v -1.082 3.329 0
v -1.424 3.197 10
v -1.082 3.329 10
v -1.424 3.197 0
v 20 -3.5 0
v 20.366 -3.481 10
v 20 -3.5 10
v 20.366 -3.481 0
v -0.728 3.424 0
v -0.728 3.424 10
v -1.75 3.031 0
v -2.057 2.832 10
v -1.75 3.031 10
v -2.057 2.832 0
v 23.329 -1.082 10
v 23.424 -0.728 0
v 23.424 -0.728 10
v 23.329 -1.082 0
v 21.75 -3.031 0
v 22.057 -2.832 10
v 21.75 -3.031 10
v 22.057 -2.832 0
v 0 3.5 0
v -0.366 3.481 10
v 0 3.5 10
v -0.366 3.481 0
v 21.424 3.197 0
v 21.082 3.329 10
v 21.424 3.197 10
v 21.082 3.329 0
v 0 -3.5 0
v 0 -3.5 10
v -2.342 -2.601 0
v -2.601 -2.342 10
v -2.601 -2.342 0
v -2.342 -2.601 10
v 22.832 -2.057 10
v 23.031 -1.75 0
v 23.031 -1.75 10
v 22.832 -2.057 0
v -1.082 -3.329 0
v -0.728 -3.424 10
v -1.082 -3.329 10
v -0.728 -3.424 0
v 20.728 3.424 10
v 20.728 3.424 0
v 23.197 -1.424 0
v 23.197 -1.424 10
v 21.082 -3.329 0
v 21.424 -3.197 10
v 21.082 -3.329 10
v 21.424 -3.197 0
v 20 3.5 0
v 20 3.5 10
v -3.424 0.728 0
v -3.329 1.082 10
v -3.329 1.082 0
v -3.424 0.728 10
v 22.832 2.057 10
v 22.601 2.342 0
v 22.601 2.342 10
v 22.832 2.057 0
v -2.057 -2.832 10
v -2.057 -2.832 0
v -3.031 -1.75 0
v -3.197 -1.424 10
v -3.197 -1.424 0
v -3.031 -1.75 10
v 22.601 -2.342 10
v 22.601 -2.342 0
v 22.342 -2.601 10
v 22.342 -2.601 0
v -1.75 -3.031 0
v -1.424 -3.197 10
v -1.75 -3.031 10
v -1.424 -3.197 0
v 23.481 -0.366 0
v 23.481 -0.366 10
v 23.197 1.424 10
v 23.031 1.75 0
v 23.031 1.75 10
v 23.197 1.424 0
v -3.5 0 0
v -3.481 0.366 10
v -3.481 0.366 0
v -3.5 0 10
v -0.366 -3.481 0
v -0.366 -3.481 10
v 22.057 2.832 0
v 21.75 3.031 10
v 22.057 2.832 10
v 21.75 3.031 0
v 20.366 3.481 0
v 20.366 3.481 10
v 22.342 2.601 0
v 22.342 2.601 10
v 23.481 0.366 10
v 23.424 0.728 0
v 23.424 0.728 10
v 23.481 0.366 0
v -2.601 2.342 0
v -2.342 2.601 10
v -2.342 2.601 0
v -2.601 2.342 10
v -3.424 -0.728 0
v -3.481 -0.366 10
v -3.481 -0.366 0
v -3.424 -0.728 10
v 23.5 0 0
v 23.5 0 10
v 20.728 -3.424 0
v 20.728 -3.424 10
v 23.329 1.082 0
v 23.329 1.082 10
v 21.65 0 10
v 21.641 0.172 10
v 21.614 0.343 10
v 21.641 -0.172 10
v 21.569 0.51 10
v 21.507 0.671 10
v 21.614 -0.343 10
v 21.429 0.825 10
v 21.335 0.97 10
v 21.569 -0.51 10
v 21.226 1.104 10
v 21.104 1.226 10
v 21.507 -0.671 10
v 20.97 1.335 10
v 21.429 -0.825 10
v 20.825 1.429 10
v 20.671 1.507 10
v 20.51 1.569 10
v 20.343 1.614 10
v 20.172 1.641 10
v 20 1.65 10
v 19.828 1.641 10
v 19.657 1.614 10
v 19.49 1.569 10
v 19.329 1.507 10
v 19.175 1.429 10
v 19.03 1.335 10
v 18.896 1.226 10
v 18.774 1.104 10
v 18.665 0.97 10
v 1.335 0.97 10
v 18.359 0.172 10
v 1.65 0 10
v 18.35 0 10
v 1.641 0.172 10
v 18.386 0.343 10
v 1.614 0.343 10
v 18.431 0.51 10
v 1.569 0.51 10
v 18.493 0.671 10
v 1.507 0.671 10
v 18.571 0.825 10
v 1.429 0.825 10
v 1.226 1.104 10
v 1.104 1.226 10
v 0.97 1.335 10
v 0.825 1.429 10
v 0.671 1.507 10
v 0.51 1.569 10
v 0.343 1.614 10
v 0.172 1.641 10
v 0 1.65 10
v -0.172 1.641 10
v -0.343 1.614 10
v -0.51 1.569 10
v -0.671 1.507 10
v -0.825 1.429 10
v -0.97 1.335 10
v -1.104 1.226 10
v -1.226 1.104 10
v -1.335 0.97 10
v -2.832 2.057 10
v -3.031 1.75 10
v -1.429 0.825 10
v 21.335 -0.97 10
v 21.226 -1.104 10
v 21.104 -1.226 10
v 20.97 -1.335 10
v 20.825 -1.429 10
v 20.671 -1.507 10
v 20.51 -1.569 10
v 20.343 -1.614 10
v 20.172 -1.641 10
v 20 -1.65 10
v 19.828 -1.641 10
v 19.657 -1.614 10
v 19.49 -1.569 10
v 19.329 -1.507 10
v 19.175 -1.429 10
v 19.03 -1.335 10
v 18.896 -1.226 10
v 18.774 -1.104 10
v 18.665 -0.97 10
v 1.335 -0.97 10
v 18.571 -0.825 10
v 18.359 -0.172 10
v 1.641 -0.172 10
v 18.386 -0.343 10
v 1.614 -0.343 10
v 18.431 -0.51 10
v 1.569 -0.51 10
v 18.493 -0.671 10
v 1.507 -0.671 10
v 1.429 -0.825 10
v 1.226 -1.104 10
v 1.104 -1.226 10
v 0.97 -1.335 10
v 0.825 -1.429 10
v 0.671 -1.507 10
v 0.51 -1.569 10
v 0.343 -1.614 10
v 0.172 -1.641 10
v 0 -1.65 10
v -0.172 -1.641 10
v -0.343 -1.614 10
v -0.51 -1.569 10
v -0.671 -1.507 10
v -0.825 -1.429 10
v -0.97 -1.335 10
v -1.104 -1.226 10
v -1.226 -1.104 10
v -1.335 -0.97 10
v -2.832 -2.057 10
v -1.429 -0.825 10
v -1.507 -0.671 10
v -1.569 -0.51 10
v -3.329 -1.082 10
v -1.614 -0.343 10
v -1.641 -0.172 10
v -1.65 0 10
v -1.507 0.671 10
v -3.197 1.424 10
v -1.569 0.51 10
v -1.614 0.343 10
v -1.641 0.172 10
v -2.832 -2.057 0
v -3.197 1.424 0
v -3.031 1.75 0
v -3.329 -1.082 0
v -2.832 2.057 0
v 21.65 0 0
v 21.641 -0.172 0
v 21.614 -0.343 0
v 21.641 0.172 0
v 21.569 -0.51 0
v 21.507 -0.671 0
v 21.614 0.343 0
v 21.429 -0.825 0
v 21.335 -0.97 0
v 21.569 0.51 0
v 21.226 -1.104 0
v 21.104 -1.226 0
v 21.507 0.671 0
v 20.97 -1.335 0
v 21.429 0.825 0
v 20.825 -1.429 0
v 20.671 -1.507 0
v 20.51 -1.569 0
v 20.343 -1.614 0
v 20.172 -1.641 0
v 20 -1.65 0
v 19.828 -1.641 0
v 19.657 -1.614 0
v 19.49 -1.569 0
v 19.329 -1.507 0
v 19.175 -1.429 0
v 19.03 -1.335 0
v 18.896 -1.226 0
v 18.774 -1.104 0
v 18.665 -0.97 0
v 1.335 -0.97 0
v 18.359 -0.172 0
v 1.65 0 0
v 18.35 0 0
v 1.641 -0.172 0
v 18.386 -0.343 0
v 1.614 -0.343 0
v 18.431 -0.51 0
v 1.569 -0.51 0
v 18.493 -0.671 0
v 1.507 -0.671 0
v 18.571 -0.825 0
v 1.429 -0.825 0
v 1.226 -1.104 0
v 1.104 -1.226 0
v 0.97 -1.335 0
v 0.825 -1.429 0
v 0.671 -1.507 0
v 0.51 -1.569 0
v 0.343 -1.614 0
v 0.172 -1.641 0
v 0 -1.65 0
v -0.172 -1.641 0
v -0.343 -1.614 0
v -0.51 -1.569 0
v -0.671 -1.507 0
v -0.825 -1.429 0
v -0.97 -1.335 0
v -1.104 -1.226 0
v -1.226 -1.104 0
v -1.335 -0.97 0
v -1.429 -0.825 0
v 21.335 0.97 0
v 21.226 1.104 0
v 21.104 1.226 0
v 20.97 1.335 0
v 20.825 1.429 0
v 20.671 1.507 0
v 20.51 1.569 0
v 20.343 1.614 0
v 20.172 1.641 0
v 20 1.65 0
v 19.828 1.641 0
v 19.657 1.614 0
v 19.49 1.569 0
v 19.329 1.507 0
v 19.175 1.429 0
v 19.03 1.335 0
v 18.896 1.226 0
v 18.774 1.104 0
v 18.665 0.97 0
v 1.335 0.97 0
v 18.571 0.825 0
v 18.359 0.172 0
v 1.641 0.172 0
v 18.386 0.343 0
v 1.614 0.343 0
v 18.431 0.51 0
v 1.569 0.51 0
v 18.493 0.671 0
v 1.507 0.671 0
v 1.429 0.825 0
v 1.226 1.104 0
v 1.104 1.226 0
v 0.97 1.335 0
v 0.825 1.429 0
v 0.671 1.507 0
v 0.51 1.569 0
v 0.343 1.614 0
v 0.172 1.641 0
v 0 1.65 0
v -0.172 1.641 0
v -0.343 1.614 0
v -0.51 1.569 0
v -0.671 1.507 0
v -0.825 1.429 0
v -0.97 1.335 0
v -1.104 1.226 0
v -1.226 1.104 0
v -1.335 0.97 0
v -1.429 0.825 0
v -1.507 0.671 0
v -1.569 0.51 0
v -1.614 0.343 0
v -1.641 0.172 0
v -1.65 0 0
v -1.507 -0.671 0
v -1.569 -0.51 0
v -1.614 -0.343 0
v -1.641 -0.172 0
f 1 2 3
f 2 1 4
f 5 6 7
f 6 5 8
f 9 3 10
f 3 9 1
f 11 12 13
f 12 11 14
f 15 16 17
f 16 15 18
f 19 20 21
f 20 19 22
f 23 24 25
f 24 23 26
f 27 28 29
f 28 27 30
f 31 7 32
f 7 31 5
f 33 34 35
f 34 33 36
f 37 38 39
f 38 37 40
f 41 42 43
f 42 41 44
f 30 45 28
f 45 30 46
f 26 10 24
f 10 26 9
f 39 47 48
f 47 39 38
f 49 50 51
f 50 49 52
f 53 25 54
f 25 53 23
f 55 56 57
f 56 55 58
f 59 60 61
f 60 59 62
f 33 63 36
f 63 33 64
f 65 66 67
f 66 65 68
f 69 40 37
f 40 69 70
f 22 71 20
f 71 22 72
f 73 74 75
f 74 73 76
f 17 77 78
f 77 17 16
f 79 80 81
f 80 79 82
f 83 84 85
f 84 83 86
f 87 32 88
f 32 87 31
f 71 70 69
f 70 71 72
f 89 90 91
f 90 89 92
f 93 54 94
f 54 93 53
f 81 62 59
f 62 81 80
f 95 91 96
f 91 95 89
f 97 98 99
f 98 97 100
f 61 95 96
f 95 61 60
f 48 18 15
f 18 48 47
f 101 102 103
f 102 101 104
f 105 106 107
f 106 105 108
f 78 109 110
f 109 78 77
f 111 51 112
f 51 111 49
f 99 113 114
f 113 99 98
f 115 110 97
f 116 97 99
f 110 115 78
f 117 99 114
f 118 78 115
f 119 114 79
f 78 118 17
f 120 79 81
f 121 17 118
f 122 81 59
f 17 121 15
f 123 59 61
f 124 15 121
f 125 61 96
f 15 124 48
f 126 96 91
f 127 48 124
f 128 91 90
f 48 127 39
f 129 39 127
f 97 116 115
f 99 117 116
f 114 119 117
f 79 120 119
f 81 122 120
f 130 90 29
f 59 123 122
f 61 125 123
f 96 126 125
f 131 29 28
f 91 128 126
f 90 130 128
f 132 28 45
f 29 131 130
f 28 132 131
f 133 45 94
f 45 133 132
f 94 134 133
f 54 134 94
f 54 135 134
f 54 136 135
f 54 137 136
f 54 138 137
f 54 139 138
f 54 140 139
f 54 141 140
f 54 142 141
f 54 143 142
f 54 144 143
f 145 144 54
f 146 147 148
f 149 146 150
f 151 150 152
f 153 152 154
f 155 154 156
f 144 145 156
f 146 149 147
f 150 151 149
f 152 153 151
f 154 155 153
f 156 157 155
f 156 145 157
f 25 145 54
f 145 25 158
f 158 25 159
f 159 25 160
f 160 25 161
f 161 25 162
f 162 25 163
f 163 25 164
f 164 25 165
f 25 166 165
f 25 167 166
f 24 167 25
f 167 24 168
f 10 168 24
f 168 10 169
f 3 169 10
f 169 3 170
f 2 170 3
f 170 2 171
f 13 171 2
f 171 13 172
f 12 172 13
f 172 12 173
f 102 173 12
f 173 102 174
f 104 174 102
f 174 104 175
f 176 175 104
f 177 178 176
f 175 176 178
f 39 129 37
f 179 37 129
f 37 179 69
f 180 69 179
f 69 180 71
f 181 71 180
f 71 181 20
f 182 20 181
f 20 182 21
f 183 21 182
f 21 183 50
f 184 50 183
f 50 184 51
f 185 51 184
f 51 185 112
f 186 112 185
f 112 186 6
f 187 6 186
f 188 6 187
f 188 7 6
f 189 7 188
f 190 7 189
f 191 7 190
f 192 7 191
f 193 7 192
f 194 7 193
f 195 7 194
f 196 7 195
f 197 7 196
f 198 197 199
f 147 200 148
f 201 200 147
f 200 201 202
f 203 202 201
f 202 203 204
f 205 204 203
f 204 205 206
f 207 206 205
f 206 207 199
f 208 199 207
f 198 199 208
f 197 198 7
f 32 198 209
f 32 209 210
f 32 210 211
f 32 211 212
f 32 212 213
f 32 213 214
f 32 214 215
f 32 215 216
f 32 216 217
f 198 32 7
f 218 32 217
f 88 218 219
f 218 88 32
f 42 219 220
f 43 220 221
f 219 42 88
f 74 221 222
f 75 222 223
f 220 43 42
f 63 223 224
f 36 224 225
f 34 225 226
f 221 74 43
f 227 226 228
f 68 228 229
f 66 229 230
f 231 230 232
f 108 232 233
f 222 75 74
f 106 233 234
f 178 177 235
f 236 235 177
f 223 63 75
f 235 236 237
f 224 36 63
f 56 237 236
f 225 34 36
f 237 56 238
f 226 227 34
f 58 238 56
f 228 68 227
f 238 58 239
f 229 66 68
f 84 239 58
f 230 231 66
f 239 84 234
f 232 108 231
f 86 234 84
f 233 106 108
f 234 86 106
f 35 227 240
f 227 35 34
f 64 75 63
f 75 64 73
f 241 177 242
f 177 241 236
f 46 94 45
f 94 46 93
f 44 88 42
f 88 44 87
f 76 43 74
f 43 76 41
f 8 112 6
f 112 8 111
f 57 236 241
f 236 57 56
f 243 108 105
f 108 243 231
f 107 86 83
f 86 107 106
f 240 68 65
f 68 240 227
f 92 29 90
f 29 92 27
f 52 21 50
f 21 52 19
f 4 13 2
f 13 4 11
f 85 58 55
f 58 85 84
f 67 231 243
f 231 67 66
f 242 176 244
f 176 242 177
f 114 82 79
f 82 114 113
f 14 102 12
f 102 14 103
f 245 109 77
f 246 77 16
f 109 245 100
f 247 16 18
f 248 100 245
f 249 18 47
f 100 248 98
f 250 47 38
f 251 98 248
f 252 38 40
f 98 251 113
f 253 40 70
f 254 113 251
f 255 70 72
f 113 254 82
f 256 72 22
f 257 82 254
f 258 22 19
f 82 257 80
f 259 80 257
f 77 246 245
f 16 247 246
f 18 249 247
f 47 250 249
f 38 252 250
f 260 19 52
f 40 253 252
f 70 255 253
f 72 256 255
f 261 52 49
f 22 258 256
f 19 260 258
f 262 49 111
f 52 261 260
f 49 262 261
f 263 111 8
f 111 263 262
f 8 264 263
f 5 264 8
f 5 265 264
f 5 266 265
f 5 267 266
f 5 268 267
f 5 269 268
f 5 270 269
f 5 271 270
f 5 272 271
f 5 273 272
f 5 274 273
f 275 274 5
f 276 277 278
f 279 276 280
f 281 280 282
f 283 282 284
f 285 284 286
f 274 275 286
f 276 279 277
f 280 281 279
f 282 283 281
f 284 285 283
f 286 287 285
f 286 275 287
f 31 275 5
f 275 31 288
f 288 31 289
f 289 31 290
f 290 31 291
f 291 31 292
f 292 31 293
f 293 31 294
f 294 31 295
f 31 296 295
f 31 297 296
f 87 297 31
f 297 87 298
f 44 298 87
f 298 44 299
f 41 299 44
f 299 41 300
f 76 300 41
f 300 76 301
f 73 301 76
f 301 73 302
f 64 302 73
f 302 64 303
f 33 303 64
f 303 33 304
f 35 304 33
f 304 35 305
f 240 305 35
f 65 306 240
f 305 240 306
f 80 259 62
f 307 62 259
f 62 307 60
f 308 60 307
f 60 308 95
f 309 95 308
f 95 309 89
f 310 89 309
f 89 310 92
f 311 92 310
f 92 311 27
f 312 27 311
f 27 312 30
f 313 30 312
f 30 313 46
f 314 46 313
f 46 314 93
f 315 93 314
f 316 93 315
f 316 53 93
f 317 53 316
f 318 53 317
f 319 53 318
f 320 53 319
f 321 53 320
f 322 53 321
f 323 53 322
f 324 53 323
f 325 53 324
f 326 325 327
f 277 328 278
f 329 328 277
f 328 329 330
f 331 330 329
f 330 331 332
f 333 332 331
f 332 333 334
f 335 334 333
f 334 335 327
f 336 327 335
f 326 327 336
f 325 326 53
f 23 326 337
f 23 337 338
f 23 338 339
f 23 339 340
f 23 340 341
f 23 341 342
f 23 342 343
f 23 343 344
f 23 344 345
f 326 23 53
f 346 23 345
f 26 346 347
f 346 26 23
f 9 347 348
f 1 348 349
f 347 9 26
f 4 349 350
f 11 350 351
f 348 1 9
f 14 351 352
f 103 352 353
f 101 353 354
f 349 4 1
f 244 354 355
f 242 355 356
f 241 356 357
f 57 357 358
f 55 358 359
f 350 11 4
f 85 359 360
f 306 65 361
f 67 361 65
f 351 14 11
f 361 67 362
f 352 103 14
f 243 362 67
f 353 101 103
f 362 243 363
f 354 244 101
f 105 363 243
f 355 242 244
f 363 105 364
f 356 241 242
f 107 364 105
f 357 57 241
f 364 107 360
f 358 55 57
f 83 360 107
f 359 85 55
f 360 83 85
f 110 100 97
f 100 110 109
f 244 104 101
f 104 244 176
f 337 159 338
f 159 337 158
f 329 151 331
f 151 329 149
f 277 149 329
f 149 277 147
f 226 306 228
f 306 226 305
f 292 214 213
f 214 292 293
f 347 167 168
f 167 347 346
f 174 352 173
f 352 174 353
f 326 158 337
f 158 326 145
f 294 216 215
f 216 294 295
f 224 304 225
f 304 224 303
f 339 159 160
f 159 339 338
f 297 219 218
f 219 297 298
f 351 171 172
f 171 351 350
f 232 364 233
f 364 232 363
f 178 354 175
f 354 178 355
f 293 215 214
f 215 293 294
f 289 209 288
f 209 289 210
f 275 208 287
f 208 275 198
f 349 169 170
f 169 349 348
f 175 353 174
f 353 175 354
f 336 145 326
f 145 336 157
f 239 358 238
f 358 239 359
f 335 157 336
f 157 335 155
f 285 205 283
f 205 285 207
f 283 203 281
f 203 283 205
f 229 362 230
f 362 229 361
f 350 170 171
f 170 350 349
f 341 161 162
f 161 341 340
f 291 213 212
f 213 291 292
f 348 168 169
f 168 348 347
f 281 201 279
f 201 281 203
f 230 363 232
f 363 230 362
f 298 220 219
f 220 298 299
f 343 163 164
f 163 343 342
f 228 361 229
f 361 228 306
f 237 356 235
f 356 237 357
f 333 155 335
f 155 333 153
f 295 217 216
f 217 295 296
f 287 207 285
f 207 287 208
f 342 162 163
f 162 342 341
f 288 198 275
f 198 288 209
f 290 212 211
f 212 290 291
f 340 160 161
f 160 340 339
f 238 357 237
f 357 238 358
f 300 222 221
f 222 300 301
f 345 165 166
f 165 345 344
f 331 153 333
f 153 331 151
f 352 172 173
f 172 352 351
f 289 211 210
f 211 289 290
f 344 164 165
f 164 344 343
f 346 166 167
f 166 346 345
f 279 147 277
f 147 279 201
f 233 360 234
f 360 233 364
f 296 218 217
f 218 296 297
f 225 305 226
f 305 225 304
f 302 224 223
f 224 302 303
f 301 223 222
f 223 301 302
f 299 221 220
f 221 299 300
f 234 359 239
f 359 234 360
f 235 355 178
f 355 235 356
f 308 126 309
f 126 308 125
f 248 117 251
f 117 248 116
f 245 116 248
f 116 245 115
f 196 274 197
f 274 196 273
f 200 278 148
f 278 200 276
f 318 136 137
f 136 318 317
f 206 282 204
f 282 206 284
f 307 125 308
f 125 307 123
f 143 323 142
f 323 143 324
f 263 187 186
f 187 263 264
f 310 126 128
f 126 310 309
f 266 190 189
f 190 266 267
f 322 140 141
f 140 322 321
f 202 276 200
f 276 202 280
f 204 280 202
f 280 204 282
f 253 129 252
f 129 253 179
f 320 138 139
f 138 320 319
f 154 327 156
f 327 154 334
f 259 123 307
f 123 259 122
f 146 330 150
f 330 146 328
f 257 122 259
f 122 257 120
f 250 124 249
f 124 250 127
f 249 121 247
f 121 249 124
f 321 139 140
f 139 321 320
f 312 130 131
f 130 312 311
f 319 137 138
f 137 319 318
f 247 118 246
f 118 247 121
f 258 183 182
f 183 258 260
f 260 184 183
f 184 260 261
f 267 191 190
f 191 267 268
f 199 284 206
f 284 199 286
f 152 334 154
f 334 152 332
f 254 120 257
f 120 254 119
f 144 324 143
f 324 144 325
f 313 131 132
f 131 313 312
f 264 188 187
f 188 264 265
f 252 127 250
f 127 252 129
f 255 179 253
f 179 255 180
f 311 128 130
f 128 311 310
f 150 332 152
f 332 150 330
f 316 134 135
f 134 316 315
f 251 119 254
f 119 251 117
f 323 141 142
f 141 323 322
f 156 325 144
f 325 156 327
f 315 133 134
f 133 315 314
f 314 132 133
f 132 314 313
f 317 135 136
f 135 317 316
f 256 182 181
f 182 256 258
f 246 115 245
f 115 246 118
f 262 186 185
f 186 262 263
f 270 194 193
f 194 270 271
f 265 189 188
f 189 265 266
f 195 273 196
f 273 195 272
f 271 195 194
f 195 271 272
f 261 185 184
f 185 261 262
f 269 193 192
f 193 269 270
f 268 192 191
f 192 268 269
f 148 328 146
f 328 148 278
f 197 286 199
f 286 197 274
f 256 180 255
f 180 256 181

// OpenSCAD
$fn=60;
hh = 10;

module Frame(k) {
    cylinder(h=k, d=7);
}

module Loch(k) {
    translate([0,0,-0.5])
    cylinder(h=k+1, d=3.3);

}

difference() {  
    hull() {
        Frame(hh);
        translate([20,0,0])
        Frame(hh);
    }
    
    Loch(hh);
    translate([20,0,0])
    Loch(hh);
}
